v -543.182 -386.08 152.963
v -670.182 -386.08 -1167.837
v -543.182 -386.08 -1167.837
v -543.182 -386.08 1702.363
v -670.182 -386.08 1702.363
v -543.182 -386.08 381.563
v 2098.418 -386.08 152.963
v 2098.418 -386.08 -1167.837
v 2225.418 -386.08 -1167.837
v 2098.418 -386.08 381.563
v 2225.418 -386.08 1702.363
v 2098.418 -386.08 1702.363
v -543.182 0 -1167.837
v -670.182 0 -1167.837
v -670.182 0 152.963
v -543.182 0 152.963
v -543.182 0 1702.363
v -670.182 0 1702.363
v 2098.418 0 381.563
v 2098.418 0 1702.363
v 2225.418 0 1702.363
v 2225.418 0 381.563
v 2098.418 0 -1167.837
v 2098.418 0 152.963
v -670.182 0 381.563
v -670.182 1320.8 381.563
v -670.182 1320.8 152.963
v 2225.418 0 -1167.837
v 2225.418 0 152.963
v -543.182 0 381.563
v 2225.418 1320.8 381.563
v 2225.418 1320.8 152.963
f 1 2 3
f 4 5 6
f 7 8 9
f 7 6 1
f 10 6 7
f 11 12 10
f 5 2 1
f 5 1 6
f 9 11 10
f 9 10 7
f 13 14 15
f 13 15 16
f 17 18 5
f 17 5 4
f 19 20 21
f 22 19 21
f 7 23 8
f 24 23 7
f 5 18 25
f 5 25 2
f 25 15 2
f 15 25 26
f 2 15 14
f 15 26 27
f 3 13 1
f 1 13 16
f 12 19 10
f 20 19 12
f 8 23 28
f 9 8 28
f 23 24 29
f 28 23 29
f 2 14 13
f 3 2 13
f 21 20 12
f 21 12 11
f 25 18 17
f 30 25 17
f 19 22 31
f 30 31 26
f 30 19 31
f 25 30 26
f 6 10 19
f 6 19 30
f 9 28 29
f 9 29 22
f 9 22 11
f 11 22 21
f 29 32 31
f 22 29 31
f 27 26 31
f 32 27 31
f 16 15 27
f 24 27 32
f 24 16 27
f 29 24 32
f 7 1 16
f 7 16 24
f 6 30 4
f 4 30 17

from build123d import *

# Parameters (mm, degrees)
F2_DEPTH = 1320.8
F1_W     = 127
F1_H     = 1320.8
F3_DEPTH = 386.08


# Not quite as in the source:
# - a feature names something its author has since deleted; it is built from what else it names


with BuildPart() as f2:
    # F1 (on Front) → F2 (new body)
    with BuildSketch(Plane.XZ):
        Polygon((-543.1821789121, 381.5627378464), (-670.1821789121, 381.5627378464), (-670.1821789121, 152.9627378464), (-543.1821789121, 152.9627378464), (2098.4178210879, 152.9627378464), (2225.4178210879, 152.9627378464), (2225.4178210879, 381.5627378464), (2098.4178210879, 381.5627378464), align=None)
    extrude(amount=-F2_DEPTH)

    # F1 (on Front) → F3 (join)
    with BuildSketch(Plane.XZ):
        with Locations((-606.6821789121, 1041.9627378464)):
            Rectangle(F1_W, F1_H)
        Polygon((-543.1821789121, 381.5627378464), (-670.1821789121, 381.5627378464), (-670.1821789121, 152.9627378464), (-543.1821789121, 152.9627378464), (2098.4178210879, 152.9627378464), (2225.4178210879, 152.9627378464), (2225.4178210879, 381.5627378464), (2098.4178210879, 381.5627378464), align=None)
        with Locations((-606.6821789121, -507.4372621536)):
            Rectangle(F1_W, F1_H)
        with Locations((2161.9178210879, 1041.9627378464)):
            Rectangle(F1_W, F1_H)
        with Locations((2161.9178210879, -507.4372621536)):
            Rectangle(F1_W, F1_H)
    extrude(amount=F3_DEPTH)


solid = f2.part
